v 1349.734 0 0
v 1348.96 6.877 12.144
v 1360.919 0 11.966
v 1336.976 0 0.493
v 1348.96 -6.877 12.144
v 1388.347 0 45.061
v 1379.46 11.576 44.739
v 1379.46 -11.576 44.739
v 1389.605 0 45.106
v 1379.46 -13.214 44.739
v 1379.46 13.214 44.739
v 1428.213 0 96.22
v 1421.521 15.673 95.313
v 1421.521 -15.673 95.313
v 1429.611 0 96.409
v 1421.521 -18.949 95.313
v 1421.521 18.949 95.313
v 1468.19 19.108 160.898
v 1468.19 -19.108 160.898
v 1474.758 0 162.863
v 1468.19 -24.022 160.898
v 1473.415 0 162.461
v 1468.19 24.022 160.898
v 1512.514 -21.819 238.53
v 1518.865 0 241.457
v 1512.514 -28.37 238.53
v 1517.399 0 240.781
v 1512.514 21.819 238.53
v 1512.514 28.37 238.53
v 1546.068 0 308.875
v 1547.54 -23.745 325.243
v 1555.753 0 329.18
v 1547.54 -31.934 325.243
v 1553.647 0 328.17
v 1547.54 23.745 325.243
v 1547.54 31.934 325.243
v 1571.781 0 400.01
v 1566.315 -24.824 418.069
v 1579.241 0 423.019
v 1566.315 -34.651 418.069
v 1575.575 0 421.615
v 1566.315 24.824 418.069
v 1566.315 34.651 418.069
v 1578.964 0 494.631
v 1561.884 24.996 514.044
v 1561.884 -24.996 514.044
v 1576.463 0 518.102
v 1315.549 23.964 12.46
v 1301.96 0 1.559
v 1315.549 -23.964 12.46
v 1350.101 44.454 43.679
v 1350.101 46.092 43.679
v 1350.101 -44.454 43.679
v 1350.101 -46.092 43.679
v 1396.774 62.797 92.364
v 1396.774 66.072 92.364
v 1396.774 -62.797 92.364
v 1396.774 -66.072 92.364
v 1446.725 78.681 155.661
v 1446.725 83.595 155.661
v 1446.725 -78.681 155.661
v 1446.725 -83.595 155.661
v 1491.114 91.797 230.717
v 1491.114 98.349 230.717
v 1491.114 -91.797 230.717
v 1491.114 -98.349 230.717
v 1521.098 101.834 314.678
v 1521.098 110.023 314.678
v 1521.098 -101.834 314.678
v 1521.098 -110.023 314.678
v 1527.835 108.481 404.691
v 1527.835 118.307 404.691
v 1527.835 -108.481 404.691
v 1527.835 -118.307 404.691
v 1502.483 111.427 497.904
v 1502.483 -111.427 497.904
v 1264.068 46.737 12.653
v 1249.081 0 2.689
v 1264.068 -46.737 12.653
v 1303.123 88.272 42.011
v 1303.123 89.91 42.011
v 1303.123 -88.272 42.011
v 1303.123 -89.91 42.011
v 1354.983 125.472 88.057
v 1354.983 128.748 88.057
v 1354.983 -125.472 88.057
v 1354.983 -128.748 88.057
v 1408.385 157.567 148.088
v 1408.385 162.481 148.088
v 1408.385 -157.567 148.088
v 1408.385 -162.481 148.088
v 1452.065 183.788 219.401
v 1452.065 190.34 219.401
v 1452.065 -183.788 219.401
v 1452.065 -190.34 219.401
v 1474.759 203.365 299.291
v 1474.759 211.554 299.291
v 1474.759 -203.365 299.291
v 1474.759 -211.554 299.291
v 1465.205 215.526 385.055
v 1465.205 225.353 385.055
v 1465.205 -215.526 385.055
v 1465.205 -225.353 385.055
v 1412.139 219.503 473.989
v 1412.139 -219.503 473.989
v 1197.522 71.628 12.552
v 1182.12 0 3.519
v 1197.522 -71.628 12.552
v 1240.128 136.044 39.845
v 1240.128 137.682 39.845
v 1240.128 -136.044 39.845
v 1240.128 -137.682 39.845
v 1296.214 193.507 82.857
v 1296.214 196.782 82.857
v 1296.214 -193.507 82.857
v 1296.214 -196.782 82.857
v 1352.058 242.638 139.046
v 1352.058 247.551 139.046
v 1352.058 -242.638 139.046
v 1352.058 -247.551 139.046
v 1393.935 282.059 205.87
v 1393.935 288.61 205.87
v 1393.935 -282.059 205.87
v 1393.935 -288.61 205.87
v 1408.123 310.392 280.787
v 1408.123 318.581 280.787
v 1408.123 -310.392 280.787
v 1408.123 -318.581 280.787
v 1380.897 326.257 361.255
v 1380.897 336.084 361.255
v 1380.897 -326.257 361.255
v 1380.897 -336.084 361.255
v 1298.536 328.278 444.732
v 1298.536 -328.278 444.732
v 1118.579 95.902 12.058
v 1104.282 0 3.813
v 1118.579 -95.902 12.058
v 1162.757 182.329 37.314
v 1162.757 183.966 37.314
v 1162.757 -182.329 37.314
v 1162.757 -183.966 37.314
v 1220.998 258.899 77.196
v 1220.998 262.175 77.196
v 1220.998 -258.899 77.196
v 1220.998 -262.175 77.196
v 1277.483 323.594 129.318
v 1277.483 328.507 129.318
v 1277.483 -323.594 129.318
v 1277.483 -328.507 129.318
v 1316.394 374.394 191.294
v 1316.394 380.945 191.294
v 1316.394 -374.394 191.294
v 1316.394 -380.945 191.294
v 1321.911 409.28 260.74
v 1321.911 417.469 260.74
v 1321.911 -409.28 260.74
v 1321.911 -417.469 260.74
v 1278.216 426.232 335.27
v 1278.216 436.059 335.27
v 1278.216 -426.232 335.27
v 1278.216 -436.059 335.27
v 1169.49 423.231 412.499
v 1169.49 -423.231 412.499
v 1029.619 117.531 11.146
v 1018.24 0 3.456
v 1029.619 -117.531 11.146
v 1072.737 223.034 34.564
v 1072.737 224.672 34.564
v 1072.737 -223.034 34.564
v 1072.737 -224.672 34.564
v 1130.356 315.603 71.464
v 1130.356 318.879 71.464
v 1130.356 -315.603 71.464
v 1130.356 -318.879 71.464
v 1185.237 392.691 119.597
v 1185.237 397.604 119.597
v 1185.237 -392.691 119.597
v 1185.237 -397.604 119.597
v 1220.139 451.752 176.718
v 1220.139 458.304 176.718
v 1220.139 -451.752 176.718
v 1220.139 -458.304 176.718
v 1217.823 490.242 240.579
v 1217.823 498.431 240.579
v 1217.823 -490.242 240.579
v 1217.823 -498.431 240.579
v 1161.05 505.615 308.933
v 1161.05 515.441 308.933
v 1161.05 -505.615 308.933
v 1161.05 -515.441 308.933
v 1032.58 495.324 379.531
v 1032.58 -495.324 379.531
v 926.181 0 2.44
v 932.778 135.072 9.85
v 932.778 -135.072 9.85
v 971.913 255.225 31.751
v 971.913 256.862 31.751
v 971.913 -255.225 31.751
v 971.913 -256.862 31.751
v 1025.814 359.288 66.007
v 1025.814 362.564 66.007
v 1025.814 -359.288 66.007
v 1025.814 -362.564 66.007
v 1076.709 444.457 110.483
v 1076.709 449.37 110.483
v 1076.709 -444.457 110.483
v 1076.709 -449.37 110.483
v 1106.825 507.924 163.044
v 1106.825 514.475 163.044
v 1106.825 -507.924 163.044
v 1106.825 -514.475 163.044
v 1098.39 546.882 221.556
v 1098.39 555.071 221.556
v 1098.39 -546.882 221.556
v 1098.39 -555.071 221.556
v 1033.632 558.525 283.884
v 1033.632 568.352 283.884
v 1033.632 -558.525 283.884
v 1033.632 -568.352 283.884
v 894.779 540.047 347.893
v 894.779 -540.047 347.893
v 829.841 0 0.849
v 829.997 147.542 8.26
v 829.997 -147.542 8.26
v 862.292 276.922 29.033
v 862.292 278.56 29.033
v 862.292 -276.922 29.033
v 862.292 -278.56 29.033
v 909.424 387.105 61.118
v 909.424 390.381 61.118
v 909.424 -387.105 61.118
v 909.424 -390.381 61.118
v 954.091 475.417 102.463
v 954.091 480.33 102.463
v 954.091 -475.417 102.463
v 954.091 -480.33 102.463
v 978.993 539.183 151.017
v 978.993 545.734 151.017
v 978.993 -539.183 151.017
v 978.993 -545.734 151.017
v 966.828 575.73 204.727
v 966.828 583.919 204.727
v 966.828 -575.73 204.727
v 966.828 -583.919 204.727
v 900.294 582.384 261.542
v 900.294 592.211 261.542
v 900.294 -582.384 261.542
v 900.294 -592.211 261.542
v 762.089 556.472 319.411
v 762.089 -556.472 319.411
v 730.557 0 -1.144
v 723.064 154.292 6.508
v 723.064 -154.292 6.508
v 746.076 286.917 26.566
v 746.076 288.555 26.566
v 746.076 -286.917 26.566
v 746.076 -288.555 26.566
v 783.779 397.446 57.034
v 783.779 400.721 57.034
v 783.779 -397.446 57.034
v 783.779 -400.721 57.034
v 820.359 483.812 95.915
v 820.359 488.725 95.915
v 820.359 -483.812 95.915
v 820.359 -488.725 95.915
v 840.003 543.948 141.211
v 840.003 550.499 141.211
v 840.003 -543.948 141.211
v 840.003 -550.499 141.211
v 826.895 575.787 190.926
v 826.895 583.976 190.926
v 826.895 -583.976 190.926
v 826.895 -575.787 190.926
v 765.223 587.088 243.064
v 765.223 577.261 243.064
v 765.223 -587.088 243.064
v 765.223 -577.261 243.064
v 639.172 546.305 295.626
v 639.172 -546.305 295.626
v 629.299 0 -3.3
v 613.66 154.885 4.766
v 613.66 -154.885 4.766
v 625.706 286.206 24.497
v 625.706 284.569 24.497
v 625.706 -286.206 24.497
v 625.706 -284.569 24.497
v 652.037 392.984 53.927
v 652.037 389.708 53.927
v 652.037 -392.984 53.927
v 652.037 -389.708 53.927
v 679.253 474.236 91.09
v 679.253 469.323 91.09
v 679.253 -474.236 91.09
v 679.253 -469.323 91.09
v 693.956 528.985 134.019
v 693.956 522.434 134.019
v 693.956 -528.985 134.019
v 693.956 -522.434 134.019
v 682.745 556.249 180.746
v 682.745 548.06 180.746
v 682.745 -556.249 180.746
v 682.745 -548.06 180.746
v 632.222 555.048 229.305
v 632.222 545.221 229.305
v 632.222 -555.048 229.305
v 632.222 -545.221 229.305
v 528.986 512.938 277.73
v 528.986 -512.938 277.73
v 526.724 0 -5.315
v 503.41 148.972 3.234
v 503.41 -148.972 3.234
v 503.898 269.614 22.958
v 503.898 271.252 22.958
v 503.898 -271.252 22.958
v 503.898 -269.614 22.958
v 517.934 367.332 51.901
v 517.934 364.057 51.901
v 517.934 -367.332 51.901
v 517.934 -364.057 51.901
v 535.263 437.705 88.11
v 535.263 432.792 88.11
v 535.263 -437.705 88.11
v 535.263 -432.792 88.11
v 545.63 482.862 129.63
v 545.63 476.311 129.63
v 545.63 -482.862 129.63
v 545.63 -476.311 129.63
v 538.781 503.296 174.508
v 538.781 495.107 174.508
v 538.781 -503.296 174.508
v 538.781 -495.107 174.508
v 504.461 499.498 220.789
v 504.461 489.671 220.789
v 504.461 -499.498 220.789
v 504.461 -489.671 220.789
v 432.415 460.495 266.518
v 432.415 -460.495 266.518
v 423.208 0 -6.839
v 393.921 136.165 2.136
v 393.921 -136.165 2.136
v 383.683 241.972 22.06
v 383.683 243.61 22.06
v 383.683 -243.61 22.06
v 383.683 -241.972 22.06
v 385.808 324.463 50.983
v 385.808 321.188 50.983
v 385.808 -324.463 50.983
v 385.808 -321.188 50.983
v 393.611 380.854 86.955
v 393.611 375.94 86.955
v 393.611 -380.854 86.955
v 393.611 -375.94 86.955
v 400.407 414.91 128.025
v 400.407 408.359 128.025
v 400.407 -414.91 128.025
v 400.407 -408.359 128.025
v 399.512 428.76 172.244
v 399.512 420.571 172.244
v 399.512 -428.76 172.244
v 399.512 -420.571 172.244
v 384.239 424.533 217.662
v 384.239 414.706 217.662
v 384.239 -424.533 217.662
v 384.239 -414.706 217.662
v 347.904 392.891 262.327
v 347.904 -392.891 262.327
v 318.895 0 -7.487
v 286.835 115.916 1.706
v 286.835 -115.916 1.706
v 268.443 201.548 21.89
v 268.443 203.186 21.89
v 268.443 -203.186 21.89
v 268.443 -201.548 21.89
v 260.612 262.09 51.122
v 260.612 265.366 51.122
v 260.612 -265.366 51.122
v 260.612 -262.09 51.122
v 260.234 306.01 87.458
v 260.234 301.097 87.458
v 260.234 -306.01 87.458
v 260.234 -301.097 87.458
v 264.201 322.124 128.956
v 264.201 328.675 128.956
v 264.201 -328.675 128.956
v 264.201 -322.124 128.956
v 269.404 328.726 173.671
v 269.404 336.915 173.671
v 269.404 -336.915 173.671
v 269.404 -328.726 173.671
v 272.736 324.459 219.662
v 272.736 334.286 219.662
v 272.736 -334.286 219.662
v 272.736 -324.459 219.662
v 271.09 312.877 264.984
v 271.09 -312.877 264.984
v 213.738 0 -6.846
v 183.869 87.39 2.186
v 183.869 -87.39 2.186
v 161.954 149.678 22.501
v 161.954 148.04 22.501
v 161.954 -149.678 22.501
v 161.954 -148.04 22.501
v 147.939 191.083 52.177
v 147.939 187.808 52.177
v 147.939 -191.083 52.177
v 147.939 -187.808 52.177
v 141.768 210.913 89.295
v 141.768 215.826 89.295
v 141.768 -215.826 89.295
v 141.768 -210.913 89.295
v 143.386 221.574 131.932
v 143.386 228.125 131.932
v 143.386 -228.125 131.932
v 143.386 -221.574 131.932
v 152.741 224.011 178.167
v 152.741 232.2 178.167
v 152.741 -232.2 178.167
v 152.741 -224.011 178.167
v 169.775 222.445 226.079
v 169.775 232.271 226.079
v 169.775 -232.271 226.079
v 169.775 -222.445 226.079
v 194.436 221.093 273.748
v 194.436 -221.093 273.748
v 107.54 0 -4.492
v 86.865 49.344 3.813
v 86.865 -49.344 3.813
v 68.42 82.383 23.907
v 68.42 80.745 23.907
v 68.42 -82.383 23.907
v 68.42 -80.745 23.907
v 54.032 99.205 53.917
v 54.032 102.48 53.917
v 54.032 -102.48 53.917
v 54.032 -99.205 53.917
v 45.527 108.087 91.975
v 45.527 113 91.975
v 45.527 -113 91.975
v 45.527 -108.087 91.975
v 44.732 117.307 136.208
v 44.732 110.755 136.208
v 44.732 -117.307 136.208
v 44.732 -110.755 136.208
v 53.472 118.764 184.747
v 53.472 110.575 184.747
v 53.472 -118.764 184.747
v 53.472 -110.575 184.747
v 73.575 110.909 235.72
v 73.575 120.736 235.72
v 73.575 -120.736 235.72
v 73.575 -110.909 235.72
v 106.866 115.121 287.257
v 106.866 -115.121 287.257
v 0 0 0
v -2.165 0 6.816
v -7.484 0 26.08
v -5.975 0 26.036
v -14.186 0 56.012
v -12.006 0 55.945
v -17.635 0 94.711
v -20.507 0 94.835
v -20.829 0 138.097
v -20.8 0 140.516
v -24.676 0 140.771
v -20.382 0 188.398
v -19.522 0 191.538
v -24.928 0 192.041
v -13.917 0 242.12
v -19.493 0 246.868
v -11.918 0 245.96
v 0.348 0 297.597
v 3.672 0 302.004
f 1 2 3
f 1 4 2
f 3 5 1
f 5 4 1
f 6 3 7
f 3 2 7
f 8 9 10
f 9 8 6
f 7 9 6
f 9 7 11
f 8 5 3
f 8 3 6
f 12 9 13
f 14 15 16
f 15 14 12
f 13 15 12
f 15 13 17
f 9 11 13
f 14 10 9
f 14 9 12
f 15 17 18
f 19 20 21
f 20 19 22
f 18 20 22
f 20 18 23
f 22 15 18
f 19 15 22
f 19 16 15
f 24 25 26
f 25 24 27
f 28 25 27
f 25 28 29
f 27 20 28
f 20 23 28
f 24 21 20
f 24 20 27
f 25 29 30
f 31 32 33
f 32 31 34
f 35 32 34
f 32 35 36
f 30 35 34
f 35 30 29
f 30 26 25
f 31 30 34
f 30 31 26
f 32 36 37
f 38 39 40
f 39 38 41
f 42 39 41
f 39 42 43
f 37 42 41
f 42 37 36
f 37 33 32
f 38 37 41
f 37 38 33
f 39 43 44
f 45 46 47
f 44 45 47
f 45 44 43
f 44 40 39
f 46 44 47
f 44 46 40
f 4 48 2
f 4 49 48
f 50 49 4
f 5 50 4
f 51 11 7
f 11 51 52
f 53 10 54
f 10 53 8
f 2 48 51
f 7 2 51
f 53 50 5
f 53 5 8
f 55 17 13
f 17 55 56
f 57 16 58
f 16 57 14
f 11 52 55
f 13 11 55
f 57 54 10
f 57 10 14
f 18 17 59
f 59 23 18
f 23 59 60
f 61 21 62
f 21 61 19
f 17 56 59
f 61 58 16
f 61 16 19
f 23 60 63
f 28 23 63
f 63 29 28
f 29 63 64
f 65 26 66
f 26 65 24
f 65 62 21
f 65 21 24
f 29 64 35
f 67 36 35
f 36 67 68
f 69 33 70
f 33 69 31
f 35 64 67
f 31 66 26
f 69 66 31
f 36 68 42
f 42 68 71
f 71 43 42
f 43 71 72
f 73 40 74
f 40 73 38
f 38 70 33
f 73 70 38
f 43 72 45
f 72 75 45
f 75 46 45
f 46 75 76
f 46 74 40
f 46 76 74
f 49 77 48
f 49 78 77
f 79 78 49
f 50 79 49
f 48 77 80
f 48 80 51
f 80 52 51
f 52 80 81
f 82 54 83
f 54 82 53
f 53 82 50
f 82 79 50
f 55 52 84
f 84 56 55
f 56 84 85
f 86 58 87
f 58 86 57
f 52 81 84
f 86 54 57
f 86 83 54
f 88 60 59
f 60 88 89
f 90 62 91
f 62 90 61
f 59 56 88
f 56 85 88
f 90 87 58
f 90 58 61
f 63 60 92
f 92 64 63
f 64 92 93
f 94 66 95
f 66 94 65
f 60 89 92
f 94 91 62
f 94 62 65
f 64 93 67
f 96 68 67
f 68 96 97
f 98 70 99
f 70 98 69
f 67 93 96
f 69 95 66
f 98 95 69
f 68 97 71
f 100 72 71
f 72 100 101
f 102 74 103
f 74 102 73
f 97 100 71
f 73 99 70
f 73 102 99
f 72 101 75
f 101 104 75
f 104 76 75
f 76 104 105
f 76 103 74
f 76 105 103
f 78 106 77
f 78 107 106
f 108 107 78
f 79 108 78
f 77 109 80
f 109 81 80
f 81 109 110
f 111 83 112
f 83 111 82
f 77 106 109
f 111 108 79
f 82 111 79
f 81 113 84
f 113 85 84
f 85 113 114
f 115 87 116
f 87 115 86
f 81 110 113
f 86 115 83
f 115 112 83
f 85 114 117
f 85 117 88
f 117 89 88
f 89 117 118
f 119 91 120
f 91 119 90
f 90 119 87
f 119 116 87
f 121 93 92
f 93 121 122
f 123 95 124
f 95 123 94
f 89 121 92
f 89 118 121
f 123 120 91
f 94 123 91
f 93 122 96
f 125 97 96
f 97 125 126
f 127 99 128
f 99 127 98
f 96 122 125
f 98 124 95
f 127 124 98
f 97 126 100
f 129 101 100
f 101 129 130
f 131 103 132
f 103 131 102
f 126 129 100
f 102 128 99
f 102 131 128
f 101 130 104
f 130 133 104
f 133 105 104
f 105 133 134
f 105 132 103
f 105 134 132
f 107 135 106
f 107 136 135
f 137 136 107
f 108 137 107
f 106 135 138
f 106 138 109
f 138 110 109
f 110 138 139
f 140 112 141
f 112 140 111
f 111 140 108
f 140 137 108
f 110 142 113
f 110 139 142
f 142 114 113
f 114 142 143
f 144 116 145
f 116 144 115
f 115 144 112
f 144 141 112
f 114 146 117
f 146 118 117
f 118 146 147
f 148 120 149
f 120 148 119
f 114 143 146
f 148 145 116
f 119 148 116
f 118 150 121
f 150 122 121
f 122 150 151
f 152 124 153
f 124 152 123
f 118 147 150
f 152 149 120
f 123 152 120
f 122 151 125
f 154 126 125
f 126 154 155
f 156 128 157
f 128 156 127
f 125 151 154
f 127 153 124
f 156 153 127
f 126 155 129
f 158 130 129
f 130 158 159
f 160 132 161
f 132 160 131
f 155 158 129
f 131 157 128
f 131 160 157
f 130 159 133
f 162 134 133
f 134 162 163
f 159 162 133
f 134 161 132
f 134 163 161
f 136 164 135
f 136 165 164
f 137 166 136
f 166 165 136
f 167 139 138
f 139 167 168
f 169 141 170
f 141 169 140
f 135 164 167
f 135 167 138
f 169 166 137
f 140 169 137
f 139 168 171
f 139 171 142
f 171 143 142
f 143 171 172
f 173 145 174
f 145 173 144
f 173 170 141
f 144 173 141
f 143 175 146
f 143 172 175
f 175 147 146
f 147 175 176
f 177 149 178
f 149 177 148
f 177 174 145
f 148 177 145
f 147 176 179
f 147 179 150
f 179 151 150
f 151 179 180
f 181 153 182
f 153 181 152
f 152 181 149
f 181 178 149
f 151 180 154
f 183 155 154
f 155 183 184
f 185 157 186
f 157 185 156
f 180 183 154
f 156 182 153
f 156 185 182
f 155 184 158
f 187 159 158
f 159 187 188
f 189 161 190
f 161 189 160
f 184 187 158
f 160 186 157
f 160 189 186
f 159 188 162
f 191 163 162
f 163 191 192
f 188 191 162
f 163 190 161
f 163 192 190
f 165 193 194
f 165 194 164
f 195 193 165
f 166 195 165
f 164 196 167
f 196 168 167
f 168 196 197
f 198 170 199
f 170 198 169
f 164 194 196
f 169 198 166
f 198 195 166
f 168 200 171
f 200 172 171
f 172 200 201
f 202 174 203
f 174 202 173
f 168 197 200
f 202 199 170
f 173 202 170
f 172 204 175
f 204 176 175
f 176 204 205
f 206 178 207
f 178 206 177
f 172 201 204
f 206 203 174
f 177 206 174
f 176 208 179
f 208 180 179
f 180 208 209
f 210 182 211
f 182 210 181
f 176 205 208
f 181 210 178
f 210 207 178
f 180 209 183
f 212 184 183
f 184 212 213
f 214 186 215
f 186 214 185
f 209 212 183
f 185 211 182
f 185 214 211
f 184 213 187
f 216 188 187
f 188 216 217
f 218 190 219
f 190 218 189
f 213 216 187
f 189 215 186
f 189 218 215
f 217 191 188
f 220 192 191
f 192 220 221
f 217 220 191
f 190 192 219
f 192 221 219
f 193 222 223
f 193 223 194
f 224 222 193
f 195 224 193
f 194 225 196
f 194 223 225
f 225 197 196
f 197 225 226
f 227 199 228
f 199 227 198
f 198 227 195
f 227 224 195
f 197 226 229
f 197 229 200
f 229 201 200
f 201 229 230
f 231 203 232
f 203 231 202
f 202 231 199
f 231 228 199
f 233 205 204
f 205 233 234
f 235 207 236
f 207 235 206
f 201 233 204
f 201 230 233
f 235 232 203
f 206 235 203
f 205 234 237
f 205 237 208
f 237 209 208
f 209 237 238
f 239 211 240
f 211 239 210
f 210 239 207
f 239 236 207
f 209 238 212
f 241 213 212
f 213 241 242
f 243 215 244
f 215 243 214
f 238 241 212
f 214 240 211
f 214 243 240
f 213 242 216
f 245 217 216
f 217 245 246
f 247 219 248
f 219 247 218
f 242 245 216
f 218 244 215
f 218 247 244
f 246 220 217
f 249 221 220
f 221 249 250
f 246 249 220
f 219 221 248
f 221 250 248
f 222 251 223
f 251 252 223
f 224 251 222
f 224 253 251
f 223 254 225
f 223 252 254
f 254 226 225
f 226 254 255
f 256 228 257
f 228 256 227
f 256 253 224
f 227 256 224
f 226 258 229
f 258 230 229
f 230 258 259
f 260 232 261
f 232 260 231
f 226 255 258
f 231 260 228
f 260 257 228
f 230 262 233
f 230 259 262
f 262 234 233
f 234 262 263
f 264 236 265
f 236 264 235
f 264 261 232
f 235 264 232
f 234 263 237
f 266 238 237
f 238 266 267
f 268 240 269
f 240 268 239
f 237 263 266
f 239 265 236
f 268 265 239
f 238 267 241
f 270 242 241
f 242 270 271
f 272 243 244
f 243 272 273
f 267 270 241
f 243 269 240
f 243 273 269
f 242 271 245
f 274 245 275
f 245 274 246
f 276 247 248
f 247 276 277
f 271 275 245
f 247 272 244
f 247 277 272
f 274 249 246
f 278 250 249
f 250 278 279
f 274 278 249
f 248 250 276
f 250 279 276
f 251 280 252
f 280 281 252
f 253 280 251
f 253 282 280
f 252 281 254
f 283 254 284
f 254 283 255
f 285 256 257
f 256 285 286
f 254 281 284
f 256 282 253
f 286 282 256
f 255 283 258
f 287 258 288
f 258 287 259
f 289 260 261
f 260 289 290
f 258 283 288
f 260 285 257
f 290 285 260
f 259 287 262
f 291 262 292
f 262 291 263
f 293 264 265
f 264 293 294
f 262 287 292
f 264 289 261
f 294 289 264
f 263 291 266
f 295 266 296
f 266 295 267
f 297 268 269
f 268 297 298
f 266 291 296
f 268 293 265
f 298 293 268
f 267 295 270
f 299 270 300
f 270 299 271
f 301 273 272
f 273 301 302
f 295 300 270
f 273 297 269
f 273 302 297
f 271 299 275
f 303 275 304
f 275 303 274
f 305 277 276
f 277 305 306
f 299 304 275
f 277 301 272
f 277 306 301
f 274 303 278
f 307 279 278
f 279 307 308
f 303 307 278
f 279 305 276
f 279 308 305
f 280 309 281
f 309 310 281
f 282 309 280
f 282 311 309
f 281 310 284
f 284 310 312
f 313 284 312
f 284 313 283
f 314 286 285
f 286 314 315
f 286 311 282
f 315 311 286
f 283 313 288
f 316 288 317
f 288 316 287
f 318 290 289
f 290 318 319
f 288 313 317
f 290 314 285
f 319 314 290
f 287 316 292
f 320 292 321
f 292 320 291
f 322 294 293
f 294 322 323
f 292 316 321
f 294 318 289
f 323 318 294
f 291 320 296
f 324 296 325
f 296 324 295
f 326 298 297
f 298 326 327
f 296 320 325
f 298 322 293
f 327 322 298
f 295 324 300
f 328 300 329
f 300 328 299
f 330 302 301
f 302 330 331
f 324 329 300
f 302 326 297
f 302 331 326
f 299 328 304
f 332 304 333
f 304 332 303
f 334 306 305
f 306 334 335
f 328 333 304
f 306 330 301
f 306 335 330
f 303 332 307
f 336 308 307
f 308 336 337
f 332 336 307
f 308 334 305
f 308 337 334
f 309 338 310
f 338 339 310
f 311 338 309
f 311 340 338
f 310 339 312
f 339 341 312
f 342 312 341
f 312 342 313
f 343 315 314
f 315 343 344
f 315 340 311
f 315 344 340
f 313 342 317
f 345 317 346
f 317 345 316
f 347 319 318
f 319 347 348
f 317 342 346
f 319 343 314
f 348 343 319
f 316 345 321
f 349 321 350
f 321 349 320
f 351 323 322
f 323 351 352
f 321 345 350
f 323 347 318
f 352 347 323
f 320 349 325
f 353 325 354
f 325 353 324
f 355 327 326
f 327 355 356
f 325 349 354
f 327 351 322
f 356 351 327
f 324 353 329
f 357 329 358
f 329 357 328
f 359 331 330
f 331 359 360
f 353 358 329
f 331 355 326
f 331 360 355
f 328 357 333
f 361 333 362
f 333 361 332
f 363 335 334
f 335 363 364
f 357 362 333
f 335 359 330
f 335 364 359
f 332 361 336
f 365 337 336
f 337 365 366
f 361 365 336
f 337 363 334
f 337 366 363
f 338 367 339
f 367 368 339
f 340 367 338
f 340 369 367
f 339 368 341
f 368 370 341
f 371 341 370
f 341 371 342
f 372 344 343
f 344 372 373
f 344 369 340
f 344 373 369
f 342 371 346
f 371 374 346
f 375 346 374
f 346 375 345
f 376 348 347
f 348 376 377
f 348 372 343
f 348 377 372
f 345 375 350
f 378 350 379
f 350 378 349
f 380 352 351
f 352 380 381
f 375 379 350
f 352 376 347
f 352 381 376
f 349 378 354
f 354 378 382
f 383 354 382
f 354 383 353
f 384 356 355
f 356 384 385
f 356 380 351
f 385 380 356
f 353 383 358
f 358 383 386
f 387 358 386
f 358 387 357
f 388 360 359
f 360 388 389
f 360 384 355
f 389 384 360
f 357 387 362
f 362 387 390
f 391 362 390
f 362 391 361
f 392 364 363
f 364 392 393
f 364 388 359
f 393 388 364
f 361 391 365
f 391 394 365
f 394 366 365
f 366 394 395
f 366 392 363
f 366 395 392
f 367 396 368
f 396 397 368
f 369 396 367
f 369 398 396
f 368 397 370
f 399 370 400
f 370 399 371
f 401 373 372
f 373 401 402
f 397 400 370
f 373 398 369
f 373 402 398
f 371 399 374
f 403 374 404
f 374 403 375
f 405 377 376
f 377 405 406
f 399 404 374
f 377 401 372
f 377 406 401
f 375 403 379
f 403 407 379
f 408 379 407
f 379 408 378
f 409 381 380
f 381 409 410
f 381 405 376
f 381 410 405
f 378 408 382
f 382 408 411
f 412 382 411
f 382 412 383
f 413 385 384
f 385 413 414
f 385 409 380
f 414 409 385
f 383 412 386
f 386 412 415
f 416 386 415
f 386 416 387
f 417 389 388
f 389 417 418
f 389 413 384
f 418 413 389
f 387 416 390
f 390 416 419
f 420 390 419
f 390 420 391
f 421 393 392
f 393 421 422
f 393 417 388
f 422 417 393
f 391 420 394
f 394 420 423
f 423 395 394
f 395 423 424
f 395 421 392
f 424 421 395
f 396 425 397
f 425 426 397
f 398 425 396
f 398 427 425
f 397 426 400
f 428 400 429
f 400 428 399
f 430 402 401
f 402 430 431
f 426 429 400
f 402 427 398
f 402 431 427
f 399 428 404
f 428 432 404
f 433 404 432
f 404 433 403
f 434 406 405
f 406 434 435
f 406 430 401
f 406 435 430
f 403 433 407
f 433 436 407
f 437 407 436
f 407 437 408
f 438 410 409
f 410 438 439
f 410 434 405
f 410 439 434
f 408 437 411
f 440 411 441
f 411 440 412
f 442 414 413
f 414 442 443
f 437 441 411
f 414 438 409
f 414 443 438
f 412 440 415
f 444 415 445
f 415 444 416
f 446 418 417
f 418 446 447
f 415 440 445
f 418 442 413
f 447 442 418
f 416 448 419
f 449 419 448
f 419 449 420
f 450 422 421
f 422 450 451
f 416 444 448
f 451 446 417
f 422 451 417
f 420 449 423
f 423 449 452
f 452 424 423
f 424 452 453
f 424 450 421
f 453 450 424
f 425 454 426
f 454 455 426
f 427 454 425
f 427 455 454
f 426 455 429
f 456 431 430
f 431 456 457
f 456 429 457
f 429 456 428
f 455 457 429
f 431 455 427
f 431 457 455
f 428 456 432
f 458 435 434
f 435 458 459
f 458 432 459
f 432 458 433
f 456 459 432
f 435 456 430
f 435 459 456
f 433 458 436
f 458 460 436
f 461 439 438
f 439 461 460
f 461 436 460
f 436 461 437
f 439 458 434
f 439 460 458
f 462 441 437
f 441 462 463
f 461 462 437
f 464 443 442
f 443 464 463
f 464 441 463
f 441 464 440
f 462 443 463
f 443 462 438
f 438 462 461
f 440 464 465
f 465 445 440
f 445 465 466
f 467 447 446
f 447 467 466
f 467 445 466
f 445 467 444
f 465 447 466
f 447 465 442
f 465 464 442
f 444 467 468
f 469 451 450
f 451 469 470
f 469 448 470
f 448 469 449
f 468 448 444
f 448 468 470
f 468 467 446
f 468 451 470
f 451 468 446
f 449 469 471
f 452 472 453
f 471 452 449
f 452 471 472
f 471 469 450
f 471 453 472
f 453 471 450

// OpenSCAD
// Always leave at 1 else "Script timed out"
part=1;//[1,2,3,4,5,6]
LOA=rnd(900,2000);
Stern=LOA*rnd(-0.1,0.3);
Bow=LOA*rnd(-0.1,0.3);
Beam=LOA*rnd(0.05,0.3);
BeamHeight=min(Beam*rnd(0.4,1),LOA*0.1);
SternHeight=BeamHeight*rnd(0.9,3);
BowHeight=max(SternHeight*rnd(0.9,2),BeamHeight*rnd(0.9,3));;

KeelBase=LOA-Stern-Beam;
KeelLine=[
[0,0,0], 
[KeelBase*rnd(0.0,0.3),0,-KeelBase*rnd(-0.1,0.1)], 
[KeelBase*rnd(0.3,0.6),0,-KeelBase*rnd(-0.1,0.1)],
[KeelBase*rnd(0.6,0.9),0,-KeelBase*rnd(-0.1,0.1)],
[KeelBase-1,0,0],
[KeelBase-1,0,0]];
BottomLine=[
[0,0,0],
[KeelBase*rnd(0,0.3),Beam*rnd(0.1,1.5),1],
[KeelBase*rnd(0.3,0.6),Beam*rnd(0.1,2),1],
[KeelBase*rnd(0.6,0.9),Beam*rnd(0.1,3),1],
[KeelBase,0,1],
[KeelBase,0,1]];
bowbend=rnd(-1,3);
WaterLine=[
[-Stern*rnd(0.1,0.9),0,SternHeight/2],
[-Stern*rnd(0.1,0.9),Beam*rnd(0.5,2),SternHeight/2],
[KeelBase*rnd(0,2),Beam*rnd(0.5,3),BeamHeight/2],
[KeelBase+Bow*bowbend,0,BowHeight/2],
[KeelBase+Bow*bowbend,0,BowHeight/2]];
beamstern=[-Stern*rnd(-0.1,1),0,SternHeight];
BeamLine=[
beamstern,
[beamstern[0]+Beam*rnd(0,1),Beam*rnd(0.15,1.5),(BeamHeight+SternHeight)/2],
[KeelBase*rnd(0.0,0.5),Beam*rnd(0.15,2),BeamHeight],
[(KeelBase+Bow)*rnd(0.5,1),Beam*rnd(0.15,3),(BeamHeight+BowHeight)/2],
[KeelBase+Bow,0,BowHeight],
[KeelBase+Bow,0,BowHeight]];
KeelBow=concat(
[
BottomLine[len(BottomLine)-1],
WaterLine[len(WaterLine)-1],
BeamLine[len(BeamLine)-1]]);

SternLine=[BeamLine[0],WaterLine[0],BottomLine[0],KeelLine[0]];
RudderLine=[BeamLine[0]-[LOA/100,0,0],WaterLine[0]-[LOA*rnd(0.03,0.2),0,0],BottomLine[0]-[LOA*rnd(0.03,0.2),0,0],KeelLine[0]-[LOA*rnd(0.01,0.03),0,0]];
tiny=[0.0001,0.0001,0.0001];
Clinked=1;
////////////////////////////////////////////////////////////////////////////////////////////////////////////////////////////////////////////////////////


masts(floor(rnd(0,4)));

//*render()
difference(){
    
    union(){
    Railings();
    !BoatHull(0,0,16,Clinked);
    }

    union(){
   if(floor(rnd(0,2)==1)){ Middeck();}
   
    translate(tiny)BoatHull(20,18,8);
    }
 

    }       

intersection(){  hull(){  
mirrorcopy([0,-1,0]){
    extrudeT(WaterLine,16,0.05,0.99){
    translate([0,-LOA/50,0]) scale(3) cube([LOA/1000,LOA/1000,LOA/200],center=true);
    }    }}
    
    BoatHull(5,0,6);
    }
ctrl();

/////////////////////////////////////////////////////////////////////////////////////////////////////////////////////////////////////////////////////////////////////////////////////////////////////////////////////////////////
module Railings(){
    

mirrorcopy([0,-1,0]){
    extrudeT(BeamLine,16,0,1){
    translate([0,0,0]) scale(2.5) cylinder(LOA/66,LOA/300,LOA/300,center=true);
    }  }
    


extrudeT(KeelBow,16,-0.07,1){
    translate([0,0,-5]) scale(3) cube([LOA/200,LOA/150,LOA/150],center=true);
    }
/*extrudeT(KeelLine,16,0.25,0.91){
    translate([0,0,-5]) scale(3) cube([LOA/1000,LOA/150,LOA/300],center=true);
    }*/
color("RED")hull(){
extrudeT(SternLine,16,0,1.2){
    translate([0,0,-5]) scale(3) cube([LOA/200,LOA/200,LOA/150],center=true);
    }
    extrudeT(RudderLine,16,0,1.1){
    translate([0,0,-5]) scale(3) cube([LOA/200,LOA/200,LOA/150],center=true);
    }}
    
    intersection(){
    cube([LOA*2,LOA/50,LOA*2],center=true);
    BoatHull(-30,10,6);}
}
module masts(n=4){
       m=0.6/(n+1);th=LOA*0.015;
       for (s=[0.15+m:m:0.65]){
      p= [bez2(s, WaterLine)[0],0,bez2(s, WaterLine)[2]];
       
   translate(p)   cylinder(LOA*0.6,th,th*0.3);
   translate(p) translate([th,0,LOA*0.4]) mirrorcopy([0,-1,0]){ rotate([90,0,0])cylinder(LOA*0.2,th*0.5,th*0.3);   }     
       }}
    
module Middeck()
{   s=rnd(0.4,0.5);
   e=rnd(0.52,0.63); 
    bh=BeamHeight*rnd(0,0.5);
    hull(){
translate([bez2(s, BeamLine)[0],0,bez2(s, BeamLine)[2]])rotate([90,0,0])cylinder(Beam*4,bh,bh,center=true);
translate([bez2(midpoint(s,e), BeamLine)[0],0,bez2(midpoint(s,e), BeamLine)[2]])rotate([90,0,0])cylinder(Beam*4,bh,bh,center=true);
translate([bez2(e, BeamLine)[0],0,bez2(e, BeamLine)[2]])rotate([90,0,0])cylinder(Beam*4,bh,bh,center=true);}
    
    }
module BoatHull(offset=0,offset2=0,D=6,Clinker=0){
hstep=1/D;
vstep=1/(D*0.5);
    HLOA=LOA*0.5;
    offsetscale= (LOA-offset)/LOA;
    
   
for (t=[-0:hstep:1-hstep]){
spar1=[ bez2(t, BeamLine)+[0,0,-offset2],bez2(t, WaterLine),bez2(t, BottomLine),bez2(t, KeelLine)+[0,0,offset]];
spar2=[ bez2(t+hstep, BeamLine)+[0,0,-offset2],bez2(t+hstep, WaterLine),bez2(t+hstep, BottomLine),bez2(t+hstep, KeelLine)+[0,0,offset]];
  
for (v=[0:vstep:1-vstep]){
 
      
    p1=[((bez2(v, spar1)[0]-HLOA)*offsetscale)+HLOA,max(0,bez2(v, spar1)[1] ),bez2(v, spar1)[2]];
    p2=[((bez2(v+vstep, spar1)[0]-HLOA)*offsetscale)+HLOA,max(0,bez2(v+vstep, spar1)[1] ),bez2(v+vstep, spar1)[2]];
    p3=[((bez2(v, spar2)[0]-HLOA)*offsetscale)+HLOA,max(0,bez2(v, spar2)[1] ),bez2(v, spar2)[2]];
    p4=[((bez2(v+vstep, spar2)[0]-HLOA)*offsetscale)+HLOA,max(0,bez2(v+vstep, spar2)[1] ),bez2(v+vstep, spar2)[2]];
    
 p5=p2-[0,LOA/150,0]*v;
 p6=p4-[0,LOA/150,0]*v;
if (Clinker >0.5){
intersection(){
hull(){   
translate([0,-offset,0])polyhedron([p1,p5,p3,p6],[[0,2,1],[1,2,3,]]);
translate([0,-2000,0])polyhedron([p1,p5,p3,p6],[[0,2,1],[1,2,3,]]);
}
mirror([0,-1,0])hull(){
    {translate([0,-offset,0])polyhedron([p1,p5,p3,p6],[[0,2,1],[1,2,3,]]);
translate([0,-2000,0])polyhedron([p1,p5,p3,p6],[[0,2,1],[1,2,3,]]);
        }}}
    }
    else{
        
        intersection(){
hull(){   
translate([0,-offset,0])polyhedron([p1,p2,p3,p4],[[0,2,1],[1,2,3,]]);
translate([0,-2000,0])polyhedron([p1,p2,p3,p4],[[0,2,1],[1,2,3,]]);
}
mirror([0,-1,0])hull(){
    {translate([0,-offset,0])polyhedron([p1,p2,p3,p4],[[0,2,1],[1,2,3,]]);
translate([0,-2000,0])polyhedron([p1,p2,p3,p4],[[0,2,1],[1,2,3,]]);
        }}}
        
        
        
        }
    
}
}
    }
    
    module ctrl(){
        
        %color("RED"){mirror([0,-1,0]){

{ShowControl((BottomLine));
ShowControl((WaterLine));
ShowControl((BeamLine));}
}
{ShowControl((KeelLine));
ShowControl((BottomLine));
ShowControl((WaterLine));
ShowControl((BeamLine));}}}
module extrudeT(v,d=8,start=0,stop=1) {
         detail=1/d;
    for(i = [start+detail: detail: stop]) {
       for (j=[0:$children-1]) 
      hull() {
        translate(t(bez2(i,v))) rotate(bez2euler(i, v))scale(bez2(i  , v)[3]) children(j);
        translate(t(bez2(i - detail, v))) rotate(bez2euler(i - detail, v))scale(bez2(i- detail  , v)[3]) children(j);
      }
    }
  }


function  subdv(v)=[
  let(last=(len(v)-1)*3)
  for (i=[0:last])
      let(j=floor((i+1)/3))
  
  i%3 == 0?
    v[j]
  :
    i%3  == 2?
       v[j]- un(un(pre(v,j))+un(post(v,j)))*(len3(pre(v,j))+len3(post(v,j)))*0.1
        :
       v[j] +un(un(pre(v,j)) +un(post(v,j)))*(len3(pre(v,j))+len3(post(v,j)))*0.1
 
  ]
  ;
  module ShowControl(v)  
  {  // translate(t(v[0])) sphere(v[0][3]);
      for(i=[1:len(v)-1]){
       // vg  translate(t(v[i])) sphere(v[i][3]);
          hull(){
              translate(t(v[i])) sphere(0.5);
              translate(t(v[i-1])) sphere(0.5);
              }          }
      } 
      
      
      
module mirrorcopy(vec=[0,1,0]) 
{ 
    children(); 
    mirror(vec) children(); 
} 
   
      
 function bz2t(v,stop,precision=0.01,t=0,acc=0)=
    acc>=stop||t>1?
    t:
    bz2t(v,stop,precision,t+precision,acc+len3(bez2(t,v)-bez2(t+precision,v)));

function len3bz(v,precision=0.01,t=0,acc=0)=t>1?acc:len3bz(v,precision,t+precision,acc+len3(bez2(t,v)-bez2(t+precision,v)));

function bez2(t, v) = (len(v) > 2) ? bez2(t, [
  for(i = [0: len(v) - 2]) v[i] * t + v[i + 1] * (1 - t)
]): v[0] * t + v[1] * (1 - t);
function lim31(l, v) = v / len3(v) * l;
function len3(v) = sqrt(pow(v[0], 2) + pow(v[1], 2) + pow(v[2], 2));
function bez2euler(i, v) = [0, -asin(bez2v(i, v)[2]), atan2(bez2xy(bez2v(i, v))[1], bez2xy(bez2v(i, v))[0])];
  
function bez2xy(v) = lim31(1, [v[0], v[1], 0]); // down xy projection
function bez2v(i, v) = lim31(1, bez2(i - 0.0001, v) - bez2(i, v)); // unit vector at i
function t(v) = [v[0], v[1], v[2]];
function rndR()=[rands(0,360,1)[0],rands(0,360,1)[1],rands(0,360,1)[0]];
function rndV()=[rands(-1,1,1)[0],rands(-1,1,1)[0],rands(-1,1,1)[0]];
function midpoint(start,end) = start + (end  - start )/2;
function rndc()=[rands(0,1,1)[0],rands(0,1,1)[0],rands(0,1,1)[0]];     
      
      function rnd(a,b)=rands(a,b,1)[0];     

  function t(v) = [v[0], v[1], v[2]];

  
    function un(v) = v / max(len3(v),0.000001) * 1;
function len3(v) = sqrt(pow(v[0], 2) + pow(v[1], 2) + pow(v[2], 2));
  function pre(v,i)= i>0?         (v[i]-v[i-1]):[0,0,0,0];
  function post(v,i)=i<len(v)-1?  (v[i+1]-v[i]):[0,0,0,0] ;
